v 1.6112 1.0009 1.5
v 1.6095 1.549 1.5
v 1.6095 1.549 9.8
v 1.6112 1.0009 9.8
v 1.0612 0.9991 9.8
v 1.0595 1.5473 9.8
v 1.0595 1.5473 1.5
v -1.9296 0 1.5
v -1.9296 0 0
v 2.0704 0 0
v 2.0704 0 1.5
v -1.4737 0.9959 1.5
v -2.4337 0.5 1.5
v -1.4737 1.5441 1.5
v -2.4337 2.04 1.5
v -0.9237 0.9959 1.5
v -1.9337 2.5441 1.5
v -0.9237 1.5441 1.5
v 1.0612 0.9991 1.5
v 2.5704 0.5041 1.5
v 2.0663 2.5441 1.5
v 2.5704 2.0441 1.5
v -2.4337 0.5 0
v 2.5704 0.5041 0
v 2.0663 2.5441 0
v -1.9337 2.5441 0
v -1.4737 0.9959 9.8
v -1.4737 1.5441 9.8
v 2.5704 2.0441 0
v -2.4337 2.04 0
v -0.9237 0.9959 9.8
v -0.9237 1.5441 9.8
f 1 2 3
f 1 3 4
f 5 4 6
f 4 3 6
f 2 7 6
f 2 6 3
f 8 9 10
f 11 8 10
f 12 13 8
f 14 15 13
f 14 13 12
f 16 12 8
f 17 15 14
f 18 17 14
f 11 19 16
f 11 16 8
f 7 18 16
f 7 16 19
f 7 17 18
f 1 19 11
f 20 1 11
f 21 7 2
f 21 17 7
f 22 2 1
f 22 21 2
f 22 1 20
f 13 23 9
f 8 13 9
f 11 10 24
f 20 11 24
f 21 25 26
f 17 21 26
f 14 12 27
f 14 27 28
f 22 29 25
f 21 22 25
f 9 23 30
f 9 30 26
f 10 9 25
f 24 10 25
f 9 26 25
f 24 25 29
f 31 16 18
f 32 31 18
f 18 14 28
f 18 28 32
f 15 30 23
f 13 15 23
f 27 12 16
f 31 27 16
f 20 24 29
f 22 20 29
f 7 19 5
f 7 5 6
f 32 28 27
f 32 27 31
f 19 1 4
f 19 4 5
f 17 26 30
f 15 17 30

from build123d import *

# Parameters (mm, degrees)
BOSS_EXTRUDE1_DEPTH = 1.5
SKETCH2_W           = 0.55
SKETCH2_H           = 0.548166652
BOSS_EXTRUDE2_DEPTH = 8.3


with BuildPart() as part:
    # Sketch1 → Boss-Extrude1 (new body)
    with BuildSketch(Plane.XY):
        Polygon((-1.929641956, 0), (2.070358044, 0), (2.570358044, 0.504083326), (2.570358044, 2.044083326), (2.066274717, 2.544083326), (-1.933725283, 2.544083326), (-2.433725283, 2.04), (-2.433725283, 0.5), align=None)
    extrude(amount=BOSS_EXTRUDE1_DEPTH)

    # Sketch2 → Boss-Extrude2 (add)
    with BuildSketch(Plane.XY.offset(1.5)):
        with Locations((-1.198725283, 1.27)):
            Rectangle(SKETCH2_W, SKETCH2_H)
        Polygon((1.611236473, 1.000868125), (1.061239307, 0.999102598), (1.059479665, 1.547266427), (1.609476832, 1.549031954), align=None)
    extrude(amount=BOSS_EXTRUDE2_DEPTH)


solid = part.part
